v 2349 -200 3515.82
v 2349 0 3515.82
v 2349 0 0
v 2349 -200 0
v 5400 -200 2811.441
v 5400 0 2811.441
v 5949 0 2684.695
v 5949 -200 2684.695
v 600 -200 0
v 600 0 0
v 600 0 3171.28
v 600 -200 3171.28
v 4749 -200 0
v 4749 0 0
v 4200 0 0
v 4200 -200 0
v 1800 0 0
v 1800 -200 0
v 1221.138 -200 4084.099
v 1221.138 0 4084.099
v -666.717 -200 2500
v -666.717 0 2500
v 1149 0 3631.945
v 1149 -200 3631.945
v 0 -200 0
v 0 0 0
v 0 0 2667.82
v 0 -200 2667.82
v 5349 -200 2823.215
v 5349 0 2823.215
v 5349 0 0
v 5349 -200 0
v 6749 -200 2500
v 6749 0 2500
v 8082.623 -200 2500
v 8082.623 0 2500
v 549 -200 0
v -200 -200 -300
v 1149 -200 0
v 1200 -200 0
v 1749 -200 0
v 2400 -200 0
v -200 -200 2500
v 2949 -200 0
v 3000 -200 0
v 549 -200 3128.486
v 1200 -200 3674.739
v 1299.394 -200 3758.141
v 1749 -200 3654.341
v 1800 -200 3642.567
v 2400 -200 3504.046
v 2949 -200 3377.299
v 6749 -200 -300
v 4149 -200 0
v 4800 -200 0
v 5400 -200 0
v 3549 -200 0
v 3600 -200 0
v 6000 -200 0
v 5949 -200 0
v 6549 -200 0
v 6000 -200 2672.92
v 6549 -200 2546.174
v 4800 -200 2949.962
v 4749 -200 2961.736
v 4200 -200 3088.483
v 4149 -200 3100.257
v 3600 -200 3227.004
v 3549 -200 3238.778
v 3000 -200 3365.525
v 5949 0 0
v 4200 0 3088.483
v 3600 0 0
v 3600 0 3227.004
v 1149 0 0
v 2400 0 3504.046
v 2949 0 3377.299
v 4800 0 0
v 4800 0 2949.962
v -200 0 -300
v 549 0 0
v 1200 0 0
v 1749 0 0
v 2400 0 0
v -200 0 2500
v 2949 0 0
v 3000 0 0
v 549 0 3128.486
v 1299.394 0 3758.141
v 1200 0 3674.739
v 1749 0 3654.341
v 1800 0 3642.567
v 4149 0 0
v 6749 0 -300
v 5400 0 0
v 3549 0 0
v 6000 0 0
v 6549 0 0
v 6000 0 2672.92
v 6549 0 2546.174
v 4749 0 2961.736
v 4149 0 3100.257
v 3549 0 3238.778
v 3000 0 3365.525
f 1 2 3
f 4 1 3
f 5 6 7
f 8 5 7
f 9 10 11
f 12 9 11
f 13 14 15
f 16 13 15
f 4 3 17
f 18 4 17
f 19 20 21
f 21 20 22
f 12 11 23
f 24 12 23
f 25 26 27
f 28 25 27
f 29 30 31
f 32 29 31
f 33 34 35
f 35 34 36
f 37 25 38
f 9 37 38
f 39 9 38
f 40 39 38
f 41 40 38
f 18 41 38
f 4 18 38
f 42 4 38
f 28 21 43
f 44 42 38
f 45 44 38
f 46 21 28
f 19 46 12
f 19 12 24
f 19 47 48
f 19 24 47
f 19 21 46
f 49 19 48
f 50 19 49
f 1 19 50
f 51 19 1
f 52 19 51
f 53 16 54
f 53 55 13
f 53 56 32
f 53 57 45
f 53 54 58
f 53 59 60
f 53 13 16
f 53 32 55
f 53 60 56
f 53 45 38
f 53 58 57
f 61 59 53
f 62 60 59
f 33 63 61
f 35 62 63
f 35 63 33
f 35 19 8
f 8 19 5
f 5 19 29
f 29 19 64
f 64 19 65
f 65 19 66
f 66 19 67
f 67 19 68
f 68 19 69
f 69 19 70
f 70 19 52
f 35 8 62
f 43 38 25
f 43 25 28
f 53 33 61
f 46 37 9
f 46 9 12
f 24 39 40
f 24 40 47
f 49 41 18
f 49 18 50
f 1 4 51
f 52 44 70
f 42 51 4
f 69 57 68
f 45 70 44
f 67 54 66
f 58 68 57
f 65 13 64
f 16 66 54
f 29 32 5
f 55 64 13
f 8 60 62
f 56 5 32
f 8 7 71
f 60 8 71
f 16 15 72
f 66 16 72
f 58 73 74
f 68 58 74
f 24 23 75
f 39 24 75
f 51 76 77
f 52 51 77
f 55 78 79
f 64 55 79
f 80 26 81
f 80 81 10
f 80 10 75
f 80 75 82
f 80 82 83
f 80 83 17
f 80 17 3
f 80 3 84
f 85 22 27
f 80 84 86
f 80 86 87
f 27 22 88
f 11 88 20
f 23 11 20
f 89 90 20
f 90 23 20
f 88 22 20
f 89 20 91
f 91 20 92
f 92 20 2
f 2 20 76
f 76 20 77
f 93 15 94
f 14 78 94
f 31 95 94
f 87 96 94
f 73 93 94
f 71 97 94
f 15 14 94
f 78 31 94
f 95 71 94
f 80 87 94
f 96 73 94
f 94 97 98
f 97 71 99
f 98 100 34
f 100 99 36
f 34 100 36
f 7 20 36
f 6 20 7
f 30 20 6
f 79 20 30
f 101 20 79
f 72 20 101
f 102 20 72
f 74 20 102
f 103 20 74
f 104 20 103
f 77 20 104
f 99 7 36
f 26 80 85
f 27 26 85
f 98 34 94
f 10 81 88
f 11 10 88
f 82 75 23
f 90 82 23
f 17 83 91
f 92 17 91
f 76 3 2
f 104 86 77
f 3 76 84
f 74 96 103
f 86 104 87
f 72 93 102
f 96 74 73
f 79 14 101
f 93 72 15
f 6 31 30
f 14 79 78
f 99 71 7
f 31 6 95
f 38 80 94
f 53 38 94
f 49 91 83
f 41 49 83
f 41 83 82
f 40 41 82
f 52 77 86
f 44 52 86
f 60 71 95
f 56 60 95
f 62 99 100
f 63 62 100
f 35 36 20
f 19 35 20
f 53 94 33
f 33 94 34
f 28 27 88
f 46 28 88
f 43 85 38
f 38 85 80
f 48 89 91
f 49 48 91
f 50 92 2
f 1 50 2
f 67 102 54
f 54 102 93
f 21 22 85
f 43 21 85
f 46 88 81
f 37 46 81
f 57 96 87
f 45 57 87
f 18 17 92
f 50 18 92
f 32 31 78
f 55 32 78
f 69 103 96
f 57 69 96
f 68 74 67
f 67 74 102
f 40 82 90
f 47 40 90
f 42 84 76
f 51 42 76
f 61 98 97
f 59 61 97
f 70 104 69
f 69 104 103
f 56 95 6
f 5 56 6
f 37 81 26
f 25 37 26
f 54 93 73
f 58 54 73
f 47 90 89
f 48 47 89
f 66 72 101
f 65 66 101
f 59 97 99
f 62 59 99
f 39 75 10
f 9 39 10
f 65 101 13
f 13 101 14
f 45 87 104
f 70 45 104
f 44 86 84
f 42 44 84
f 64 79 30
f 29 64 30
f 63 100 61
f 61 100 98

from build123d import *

# Parameters (mm, degrees)
F1_DEPTH = 200


with BuildPart() as f1:
    # F0 (on Front) → F1 (new body)
    with BuildSketch(Plane.XZ):
        Polygon((-200, 2500), (0, 2667.8199262355), (549, 3128.4856237518), (549, 3520.1078105515), (-666.7171480581, 2500), align=None)
        Polygon((549, 3520.1078105515), (549, 3128.4856237518), (600, 3171.2797049418), (600, 3562.9018917415), align=None)
        Polygon((600, 3562.9018917415), (600, 3171.2797049418), (1149, 3631.9454024582), (1149, 4023.5675892578), align=None)
        Polygon((1149, 4023.5675892578), (1149, 3631.9454024582), (1200, 3674.7394836482), (1200, 4066.3616704479), align=None)
        Polygon((1200, 4066.3616704479), (1200, 3674.7394836482), (1299.3937450181, 3758.1407384342), (1749, 3654.3409556278), (1749, 3962.2321879658), (1221.1381631993, 4084.0986953922), align=None)
        Polygon((1749, 3962.2321879658), (1749, 3654.3409556278), (1800, 3642.5666778804), (1800, 3950.4579102184), align=None)
        Polygon((1800, 3950.4579102184), (1800, 3642.5666778804), (2349, 3515.8200409525), (2349, 3823.7112732905), align=None)
        Polygon((2349, 3823.7112732905), (2349, 3515.8200409525), (2400, 3504.0457632051), (2400, 3811.9369955431), align=None)
        Polygon((2400, 3811.9369955431), (2400, 3504.0457632051), (2949, 3377.2991262771), (2949, 3685.1903586152), align=None)
        Polygon((2949, 3685.1903586152), (2949, 3377.2991262771), (3000, 3365.5248485297), (3000, 3673.4160808678), align=None)
        Polygon((3000, 3673.4160808678), (3000, 3365.5248485297), (3549, 3238.7782116018), (3549, 3546.6694439398), align=None)
        Polygon((3549, 3546.6694439398), (3549, 3238.7782116018), (3600, 3227.0039338544), (3600, 3534.8951661924), align=None)
        Polygon((3600, 3534.8951661924), (3600, 3227.0039338544), (4149, 3100.2572969265), (4149, 3408.1485292645), align=None)
        Polygon((4200, 3088.4830191791), (4200, 3396.3742515171), (4149, 3408.1485292645), (4149, 3100.2572969265), align=None)
        Polygon((4749, 2961.7363822511), (4749, 3269.6276145891), (4200, 3396.3742515171), (4200, 3088.4830191791), align=None)
        Polygon((4800, 2949.9621045037), (4800, 3257.8533368417), (4749, 3269.6276145891), (4749, 2961.7363822511), align=None)
        Polygon((5349, 2823.2154675758), (5349, 3131.1066999138), (4800, 3257.8533368417), (4800, 2949.9621045037), align=None)
        Polygon((5400, 2811.4411898284), (5400, 3119.3324221664), (5349, 3131.1066999138), (5349, 2823.2154675758), align=None)
        Polygon((5949, 2684.6945529005), (5949, 2992.5857852385), (5400, 3119.3324221664), (5400, 2811.4411898284), align=None)
        Polygon((6549, 2546.1736382251), (6749, 2500), (8082.6234447757, 2500), (6000, 2980.8115074911), (6000, 2672.920275153), align=None)
        Polygon((6000, 2672.920275153), (6000, 2980.8115074911), (5949, 2992.5857852385), (5949, 2684.6945529005), align=None)
        Polygon((549, 0), (0, 0), (0, 2667.8199262355), (-200, 2500), (-200, -300), (6749, -300), (6749, 2500), (6549, 2546.1736382251), (6549, 0), (6000, 0), (5949, 0), (5400, 0), (5349, 0), (4800, 0), (4749, 0), (4200, 0), (4149, 0), (3600, 0), (3549, 0), (3000, 0), (2949, 0), (2400, 0), (2349, 0), (1800, 0), (1749, 0), (1200, 0), (1149, 0), (600, 0), align=None)
        Polygon((6000, 0), (6000, 2672.920275153), (5949, 2684.6945529005), (5949, 0), align=None)
        Polygon((5400, 0), (5400, 2811.4411898284), (5349, 2823.2154675758), (5349, 0), align=None)
        Polygon((4800, 0), (4800, 2949.9621045037), (4749, 2961.7363822511), (4749, 0), align=None)
        Polygon((4200, 0), (4200, 3088.4830191791), (4149, 3100.2572969265), (4149, 0), align=None)
        Polygon((3549, 3238.7782116018), (3549, 0), (3600, 0), (3600, 3227.0039338544), align=None)
        Polygon((2949, 3377.2991262771), (2949, 0), (3000, 0), (3000, 3365.5248485297), align=None)
        Polygon((2349, 3515.8200409525), (2349, 0), (2400, 0), (2400, 3504.0457632051), align=None)
        Polygon((1749, 3654.3409556278), (1749, 0), (1800, 0), (1800, 3642.5666778804), align=None)
        Polygon((1149, 3631.9454024582), (1149, 0), (1200, 0), (1200, 3674.7394836482), align=None)
        Polygon((549, 3128.4856237518), (549, 0), (600, 0), (600, 3171.2797049418), align=None)
    extrude(amount=F1_DEPTH)


solid = f1.part
